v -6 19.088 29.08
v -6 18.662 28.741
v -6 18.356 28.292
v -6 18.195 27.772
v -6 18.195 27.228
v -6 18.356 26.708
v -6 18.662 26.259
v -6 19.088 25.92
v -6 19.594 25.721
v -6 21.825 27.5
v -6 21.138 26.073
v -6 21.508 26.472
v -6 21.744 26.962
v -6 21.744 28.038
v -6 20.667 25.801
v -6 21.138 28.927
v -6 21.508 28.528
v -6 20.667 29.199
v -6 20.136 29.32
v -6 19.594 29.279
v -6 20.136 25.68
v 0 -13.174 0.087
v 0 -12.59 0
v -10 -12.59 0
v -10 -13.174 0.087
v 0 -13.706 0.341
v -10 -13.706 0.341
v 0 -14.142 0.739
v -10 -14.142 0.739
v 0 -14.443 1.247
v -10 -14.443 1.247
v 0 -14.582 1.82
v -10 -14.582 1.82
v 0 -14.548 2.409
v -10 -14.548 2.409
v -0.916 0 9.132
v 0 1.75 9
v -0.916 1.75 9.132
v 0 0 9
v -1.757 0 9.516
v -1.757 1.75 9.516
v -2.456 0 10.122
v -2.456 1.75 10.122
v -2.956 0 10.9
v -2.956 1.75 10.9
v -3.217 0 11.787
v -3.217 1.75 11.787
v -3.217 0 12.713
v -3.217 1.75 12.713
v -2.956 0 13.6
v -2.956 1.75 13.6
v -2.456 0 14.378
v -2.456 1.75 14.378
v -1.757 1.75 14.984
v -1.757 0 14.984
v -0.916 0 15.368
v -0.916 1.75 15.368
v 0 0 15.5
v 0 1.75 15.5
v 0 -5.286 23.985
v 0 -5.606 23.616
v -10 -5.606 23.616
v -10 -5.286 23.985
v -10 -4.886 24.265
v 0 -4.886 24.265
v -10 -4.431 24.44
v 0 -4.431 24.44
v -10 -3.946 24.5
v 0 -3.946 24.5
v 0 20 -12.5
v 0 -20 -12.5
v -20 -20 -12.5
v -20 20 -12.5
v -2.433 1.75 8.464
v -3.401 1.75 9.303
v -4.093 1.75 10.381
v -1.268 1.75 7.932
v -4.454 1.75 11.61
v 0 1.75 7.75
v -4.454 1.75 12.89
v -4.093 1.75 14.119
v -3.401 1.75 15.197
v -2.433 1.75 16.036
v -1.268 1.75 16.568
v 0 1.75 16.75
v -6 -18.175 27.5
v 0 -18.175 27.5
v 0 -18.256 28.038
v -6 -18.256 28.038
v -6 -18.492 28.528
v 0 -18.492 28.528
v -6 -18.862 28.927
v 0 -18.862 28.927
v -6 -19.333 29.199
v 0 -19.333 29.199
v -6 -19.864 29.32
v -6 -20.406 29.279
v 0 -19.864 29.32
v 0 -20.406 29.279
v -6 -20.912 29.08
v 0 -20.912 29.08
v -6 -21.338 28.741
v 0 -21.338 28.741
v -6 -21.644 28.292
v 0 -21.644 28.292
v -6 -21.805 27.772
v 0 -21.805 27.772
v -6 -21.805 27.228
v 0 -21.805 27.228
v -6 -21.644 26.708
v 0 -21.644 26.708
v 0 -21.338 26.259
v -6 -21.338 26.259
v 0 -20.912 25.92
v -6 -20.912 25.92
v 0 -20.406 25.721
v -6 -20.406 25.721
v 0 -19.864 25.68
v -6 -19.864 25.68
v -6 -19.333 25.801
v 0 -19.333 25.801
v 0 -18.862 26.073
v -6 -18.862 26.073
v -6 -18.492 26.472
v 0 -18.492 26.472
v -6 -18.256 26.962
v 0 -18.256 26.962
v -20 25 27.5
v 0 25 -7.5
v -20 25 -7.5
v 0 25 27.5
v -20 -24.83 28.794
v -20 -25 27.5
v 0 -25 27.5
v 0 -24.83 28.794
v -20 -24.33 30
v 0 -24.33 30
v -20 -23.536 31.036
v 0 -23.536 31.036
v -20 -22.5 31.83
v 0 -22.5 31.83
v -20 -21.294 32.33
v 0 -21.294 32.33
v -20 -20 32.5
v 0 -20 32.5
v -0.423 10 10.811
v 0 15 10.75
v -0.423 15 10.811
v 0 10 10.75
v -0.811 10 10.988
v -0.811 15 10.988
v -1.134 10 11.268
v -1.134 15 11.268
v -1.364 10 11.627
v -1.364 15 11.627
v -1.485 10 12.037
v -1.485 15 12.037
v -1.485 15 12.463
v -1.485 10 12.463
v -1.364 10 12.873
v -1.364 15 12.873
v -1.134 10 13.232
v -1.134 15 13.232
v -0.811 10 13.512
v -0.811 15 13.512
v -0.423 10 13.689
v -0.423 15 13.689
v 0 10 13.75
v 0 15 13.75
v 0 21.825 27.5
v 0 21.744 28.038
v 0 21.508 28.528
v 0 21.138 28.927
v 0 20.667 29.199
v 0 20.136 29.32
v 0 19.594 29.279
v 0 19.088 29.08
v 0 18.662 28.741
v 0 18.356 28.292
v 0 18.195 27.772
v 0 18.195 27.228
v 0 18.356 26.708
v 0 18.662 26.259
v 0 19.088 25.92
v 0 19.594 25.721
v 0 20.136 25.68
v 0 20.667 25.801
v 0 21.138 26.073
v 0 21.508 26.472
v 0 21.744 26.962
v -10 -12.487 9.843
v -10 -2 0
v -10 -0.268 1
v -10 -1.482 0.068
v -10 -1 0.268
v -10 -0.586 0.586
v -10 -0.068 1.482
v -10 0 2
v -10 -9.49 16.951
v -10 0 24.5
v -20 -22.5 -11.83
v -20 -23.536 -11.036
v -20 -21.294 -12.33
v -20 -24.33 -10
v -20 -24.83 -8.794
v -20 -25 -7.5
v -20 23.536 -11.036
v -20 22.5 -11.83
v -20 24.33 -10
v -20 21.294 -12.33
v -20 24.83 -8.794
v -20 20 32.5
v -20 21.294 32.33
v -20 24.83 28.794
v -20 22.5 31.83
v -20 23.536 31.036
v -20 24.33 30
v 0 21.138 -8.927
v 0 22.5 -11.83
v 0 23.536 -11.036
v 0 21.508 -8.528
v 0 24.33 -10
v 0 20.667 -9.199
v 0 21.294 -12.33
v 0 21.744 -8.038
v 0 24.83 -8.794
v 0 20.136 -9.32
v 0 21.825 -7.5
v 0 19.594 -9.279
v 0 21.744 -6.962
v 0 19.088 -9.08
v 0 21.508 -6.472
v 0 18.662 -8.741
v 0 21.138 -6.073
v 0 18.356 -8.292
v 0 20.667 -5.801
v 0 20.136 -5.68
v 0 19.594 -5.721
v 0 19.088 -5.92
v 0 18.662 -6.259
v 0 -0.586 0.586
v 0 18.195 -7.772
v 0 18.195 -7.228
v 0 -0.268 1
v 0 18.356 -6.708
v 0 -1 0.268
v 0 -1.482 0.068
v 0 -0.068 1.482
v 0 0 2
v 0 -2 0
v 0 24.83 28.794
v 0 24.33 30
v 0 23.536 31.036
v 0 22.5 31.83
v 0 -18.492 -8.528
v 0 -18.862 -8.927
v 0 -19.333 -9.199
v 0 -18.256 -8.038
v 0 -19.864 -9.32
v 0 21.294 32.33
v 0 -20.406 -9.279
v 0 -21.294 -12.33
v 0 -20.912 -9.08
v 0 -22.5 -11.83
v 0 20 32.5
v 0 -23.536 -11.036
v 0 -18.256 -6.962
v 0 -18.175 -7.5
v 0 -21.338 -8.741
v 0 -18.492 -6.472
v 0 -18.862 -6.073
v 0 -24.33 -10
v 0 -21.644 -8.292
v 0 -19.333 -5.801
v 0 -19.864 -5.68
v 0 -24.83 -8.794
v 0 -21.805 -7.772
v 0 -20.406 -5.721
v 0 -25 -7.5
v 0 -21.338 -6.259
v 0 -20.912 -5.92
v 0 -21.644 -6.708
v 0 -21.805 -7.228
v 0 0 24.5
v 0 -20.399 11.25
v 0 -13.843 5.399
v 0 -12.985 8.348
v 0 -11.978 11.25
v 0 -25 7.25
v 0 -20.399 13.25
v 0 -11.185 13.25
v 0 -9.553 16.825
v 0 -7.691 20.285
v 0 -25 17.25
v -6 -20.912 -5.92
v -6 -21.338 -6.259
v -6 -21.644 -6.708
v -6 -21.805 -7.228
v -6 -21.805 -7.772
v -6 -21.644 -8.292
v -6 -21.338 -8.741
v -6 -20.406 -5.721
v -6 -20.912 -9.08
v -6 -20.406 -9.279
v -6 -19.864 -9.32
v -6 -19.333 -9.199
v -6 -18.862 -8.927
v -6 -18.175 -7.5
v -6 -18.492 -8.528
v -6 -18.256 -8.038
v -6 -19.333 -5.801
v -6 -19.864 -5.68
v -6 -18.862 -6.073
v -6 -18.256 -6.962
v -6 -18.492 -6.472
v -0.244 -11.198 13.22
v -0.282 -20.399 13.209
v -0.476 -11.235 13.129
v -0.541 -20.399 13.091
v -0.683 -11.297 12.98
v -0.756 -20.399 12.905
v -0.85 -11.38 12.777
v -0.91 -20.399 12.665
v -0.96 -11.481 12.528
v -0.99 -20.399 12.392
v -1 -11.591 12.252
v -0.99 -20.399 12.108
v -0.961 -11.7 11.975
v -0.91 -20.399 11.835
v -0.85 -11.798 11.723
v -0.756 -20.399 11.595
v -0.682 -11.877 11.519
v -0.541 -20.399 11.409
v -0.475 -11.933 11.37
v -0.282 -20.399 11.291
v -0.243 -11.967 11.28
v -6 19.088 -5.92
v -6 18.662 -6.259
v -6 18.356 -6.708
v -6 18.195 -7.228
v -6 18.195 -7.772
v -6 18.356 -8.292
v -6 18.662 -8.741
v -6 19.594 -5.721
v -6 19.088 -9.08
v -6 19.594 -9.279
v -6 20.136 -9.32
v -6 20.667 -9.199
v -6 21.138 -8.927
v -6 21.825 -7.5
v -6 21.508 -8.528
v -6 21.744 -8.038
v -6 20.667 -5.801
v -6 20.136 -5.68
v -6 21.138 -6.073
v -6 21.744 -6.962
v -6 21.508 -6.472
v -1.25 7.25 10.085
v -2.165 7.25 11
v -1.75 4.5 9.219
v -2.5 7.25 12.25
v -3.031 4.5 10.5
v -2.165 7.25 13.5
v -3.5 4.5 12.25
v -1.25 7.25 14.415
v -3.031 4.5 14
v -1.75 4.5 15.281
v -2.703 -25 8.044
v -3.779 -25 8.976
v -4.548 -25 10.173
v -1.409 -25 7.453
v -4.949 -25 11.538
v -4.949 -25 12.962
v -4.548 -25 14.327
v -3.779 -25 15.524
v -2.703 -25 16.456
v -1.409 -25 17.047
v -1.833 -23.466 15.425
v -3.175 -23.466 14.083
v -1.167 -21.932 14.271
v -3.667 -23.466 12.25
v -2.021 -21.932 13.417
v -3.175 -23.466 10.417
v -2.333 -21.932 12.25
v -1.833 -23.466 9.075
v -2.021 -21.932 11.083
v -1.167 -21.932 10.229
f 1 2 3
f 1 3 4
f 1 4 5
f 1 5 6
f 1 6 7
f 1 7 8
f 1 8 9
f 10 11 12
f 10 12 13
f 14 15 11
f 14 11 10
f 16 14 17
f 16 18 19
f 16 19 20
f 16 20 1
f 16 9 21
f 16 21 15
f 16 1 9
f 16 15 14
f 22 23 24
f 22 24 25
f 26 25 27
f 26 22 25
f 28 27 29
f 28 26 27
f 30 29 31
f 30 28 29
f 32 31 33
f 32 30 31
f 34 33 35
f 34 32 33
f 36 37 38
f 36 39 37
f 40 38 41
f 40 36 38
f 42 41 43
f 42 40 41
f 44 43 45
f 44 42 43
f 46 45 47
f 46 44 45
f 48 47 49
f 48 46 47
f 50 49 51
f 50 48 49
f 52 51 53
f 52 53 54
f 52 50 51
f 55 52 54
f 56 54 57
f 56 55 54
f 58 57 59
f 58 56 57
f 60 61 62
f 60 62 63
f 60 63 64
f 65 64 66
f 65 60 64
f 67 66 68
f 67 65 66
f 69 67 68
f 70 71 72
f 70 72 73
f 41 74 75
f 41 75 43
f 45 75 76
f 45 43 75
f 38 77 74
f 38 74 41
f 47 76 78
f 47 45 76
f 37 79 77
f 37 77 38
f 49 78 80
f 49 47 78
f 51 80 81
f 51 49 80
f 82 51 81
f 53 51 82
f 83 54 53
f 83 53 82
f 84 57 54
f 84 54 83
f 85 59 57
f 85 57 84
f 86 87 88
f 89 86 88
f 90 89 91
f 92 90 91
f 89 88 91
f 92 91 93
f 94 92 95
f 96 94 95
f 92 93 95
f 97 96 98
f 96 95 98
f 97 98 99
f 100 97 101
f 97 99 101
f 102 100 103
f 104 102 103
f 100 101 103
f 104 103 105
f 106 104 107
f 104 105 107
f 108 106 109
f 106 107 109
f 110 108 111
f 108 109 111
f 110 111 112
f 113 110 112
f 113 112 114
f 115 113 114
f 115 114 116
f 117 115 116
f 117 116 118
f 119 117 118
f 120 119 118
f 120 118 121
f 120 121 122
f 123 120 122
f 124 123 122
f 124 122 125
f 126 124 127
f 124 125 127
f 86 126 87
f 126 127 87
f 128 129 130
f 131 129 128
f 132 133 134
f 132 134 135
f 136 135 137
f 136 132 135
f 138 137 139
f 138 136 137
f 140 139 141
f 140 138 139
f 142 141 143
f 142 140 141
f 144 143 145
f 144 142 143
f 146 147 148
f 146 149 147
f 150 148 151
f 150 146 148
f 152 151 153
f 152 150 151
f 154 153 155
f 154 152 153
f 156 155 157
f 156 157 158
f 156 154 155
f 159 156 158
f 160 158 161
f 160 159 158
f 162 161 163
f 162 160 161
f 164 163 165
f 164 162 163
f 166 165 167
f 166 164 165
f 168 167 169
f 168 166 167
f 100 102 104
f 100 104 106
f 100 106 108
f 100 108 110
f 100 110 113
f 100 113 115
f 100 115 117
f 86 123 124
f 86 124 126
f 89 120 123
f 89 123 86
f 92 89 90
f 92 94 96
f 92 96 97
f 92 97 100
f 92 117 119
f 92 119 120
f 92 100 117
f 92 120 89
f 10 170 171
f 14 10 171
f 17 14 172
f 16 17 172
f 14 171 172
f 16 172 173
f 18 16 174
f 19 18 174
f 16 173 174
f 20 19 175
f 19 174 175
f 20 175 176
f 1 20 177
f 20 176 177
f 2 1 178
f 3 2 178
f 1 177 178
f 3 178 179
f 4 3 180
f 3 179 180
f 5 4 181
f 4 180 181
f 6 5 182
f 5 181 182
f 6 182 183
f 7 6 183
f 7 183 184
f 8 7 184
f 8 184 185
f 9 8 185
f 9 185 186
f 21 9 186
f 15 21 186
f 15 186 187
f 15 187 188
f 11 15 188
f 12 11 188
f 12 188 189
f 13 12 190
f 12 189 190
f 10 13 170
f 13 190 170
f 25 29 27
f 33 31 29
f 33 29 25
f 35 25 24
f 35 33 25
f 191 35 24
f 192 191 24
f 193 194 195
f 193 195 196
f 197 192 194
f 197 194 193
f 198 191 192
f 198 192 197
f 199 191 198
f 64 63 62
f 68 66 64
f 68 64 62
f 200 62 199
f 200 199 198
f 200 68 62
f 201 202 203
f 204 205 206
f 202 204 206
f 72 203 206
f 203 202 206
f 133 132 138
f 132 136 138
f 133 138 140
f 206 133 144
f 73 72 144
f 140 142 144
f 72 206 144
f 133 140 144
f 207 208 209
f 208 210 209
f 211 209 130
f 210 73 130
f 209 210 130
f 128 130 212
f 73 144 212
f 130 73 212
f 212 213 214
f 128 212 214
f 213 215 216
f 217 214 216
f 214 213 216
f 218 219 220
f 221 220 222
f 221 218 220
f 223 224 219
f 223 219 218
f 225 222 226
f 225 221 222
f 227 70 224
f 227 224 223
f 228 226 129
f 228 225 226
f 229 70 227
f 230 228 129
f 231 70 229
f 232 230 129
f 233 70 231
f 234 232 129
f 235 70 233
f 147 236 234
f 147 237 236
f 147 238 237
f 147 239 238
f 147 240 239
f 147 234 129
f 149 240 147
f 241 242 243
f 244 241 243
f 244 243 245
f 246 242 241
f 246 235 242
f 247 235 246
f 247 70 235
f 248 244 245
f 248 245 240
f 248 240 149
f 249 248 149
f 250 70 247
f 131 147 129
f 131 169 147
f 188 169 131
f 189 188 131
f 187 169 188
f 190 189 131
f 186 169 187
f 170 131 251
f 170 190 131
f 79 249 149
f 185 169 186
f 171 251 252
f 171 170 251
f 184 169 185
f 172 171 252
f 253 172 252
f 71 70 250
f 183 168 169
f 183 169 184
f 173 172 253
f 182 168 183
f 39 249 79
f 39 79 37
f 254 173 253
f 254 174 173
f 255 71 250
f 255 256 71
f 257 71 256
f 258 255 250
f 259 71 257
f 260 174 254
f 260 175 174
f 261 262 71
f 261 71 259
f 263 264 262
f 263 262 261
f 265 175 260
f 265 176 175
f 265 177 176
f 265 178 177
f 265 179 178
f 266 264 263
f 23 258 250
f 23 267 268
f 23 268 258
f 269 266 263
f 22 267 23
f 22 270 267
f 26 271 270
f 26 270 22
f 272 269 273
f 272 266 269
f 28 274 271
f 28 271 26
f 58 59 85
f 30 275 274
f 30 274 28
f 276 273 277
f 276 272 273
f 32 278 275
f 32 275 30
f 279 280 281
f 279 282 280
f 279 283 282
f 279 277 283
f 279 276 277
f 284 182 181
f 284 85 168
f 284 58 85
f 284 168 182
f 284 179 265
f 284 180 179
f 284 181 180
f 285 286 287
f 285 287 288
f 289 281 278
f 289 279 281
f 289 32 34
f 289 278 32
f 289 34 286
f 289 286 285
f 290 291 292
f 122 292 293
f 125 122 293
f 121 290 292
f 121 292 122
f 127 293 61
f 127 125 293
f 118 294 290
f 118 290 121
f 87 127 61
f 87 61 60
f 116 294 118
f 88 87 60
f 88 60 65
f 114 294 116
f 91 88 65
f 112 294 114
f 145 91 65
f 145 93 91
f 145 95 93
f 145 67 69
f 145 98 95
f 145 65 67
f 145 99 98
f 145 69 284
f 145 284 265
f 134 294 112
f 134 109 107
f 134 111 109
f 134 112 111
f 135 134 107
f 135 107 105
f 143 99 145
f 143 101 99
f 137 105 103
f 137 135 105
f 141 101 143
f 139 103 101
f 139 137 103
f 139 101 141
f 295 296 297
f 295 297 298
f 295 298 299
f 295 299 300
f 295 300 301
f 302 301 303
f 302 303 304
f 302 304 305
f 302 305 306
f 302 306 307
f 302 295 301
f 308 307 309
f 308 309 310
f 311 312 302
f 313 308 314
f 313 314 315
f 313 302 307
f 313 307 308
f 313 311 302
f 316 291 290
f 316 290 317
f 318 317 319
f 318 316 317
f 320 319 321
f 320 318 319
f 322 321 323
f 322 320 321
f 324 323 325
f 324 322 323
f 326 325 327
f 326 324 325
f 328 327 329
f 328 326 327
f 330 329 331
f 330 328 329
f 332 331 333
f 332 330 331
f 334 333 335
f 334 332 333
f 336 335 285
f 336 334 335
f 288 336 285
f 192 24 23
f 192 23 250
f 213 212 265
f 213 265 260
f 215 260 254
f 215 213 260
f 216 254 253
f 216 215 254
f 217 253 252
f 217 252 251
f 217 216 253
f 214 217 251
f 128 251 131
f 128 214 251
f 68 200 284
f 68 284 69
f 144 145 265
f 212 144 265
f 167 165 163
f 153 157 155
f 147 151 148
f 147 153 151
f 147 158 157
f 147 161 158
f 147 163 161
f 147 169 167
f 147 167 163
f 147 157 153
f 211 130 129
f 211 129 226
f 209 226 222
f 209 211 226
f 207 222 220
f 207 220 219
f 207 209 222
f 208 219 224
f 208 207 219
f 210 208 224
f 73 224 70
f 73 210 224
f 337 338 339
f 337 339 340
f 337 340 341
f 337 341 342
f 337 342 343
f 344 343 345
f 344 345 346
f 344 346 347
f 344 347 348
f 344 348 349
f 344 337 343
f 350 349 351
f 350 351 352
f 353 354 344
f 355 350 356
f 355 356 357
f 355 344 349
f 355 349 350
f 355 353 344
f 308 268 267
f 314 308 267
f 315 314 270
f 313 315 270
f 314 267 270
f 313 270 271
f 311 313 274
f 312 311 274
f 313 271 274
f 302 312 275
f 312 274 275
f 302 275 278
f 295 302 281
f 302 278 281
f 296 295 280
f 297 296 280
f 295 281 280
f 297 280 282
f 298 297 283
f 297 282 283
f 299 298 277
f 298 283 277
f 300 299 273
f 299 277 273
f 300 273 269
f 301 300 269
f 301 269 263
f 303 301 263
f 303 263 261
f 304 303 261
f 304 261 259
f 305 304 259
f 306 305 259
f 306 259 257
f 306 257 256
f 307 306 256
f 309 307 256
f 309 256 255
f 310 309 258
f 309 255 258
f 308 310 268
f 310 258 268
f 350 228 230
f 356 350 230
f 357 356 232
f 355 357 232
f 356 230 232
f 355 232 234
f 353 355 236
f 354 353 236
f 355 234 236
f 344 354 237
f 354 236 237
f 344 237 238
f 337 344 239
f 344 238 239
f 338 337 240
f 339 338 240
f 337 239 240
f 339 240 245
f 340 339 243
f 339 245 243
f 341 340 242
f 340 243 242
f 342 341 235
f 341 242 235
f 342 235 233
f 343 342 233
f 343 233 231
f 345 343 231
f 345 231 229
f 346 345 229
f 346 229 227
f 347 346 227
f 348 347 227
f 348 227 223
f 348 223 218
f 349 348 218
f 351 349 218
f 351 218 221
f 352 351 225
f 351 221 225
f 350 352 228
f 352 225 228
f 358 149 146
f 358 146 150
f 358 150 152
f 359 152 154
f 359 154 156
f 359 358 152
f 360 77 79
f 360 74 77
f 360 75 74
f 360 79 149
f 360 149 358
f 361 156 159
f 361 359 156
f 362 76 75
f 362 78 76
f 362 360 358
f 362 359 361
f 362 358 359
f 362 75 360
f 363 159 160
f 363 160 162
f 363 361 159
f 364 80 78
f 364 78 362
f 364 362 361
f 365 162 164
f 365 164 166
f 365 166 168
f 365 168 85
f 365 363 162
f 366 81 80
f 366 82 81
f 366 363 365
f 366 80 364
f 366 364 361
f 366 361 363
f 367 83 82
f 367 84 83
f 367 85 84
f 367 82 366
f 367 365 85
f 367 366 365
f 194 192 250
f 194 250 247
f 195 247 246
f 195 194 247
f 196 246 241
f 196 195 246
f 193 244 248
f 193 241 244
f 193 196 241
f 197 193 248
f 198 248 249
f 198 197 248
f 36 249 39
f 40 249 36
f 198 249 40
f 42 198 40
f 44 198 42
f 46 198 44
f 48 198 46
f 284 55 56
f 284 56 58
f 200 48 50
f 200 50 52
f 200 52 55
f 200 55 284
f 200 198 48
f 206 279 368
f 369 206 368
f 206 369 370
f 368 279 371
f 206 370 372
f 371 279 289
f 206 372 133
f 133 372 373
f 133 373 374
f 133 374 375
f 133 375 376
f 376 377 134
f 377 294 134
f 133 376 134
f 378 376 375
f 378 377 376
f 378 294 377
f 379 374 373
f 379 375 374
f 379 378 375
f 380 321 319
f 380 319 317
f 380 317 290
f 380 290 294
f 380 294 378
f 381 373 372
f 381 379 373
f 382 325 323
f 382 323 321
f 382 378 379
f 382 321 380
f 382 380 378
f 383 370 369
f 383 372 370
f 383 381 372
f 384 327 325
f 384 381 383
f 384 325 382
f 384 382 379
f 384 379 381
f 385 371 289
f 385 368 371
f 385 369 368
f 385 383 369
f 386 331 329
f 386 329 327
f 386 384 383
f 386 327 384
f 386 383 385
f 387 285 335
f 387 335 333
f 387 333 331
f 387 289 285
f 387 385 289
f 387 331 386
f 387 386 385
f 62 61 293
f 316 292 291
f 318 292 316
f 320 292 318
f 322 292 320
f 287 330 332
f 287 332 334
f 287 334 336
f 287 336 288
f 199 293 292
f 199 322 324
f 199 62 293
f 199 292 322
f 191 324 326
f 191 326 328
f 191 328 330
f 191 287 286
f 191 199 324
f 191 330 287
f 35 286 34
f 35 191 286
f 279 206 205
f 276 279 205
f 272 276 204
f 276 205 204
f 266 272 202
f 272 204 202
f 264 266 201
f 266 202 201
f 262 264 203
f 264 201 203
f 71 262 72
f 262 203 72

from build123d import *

# Parameters (mm, degrees)
F1_DEPTH        = 10
F5_R            = 2
F6_W            = 50
F6_H            = 45
F7_DEPTH        = 20
F10_D           = 2
F10_DEPTH       = 20
F10_CSINK_D     = 10
F10_CSINK_ANGLE = 82
F10_TIP         = 0.600860619
F11_R           = 5
F12_R           = 1.75
F13_DEPTH       = 5
F15_W           = 33.0769233406
F15_H           = 100.1923158765
F16_DEPTH       = 50.001
F17_R           = 1.825
F18_DEPTH       = 6


with BuildPart() as f1:
    # F0 (on Right) → F1 (new body, symmetric)
    with BuildSketch(Plane.YZ):
        with BuildLine():
            Line((-15, 0), (0, 0))
            Line((0, 0), (0, 24.5))
            Line((0, 24.5), (-5, 24.5))
            ThreePointArc((-5, 24.5), (-11.3675088396, 12.8081668733), (-15, 0))
        make_face()
    extrude(amount=F1_DEPTH, both=True)

    # F3 (on Right) → F4 (revolve)
    with BuildSketch(Plane.YZ):
        Polygon((0, 12.25), (15, 12.25), (15, 13.75), (10, 13.75), (1.75, 16.75), (1.75, 15.5), (0, 15.5), align=None)
    revolve(axis=Axis((0, 7.5, 12.25), (0, -1, 0)))

    # F5
    f5_edges = [f1.edges().sort_by_distance(p)[0] for p in [
        (0, -5, 24.5),
        (0, -15, 0),
        (0, 0, 0),
    ]]
    fillet(f5_edges, radius=F5_R)


with BuildPart() as f7:
    # F6 (on Right) → F7 (new body)
    with BuildSketch(Plane.YZ):
        with Locations((0, 10)):
            Rectangle(F6_W, F6_H)
    extrude(amount=F7_DEPTH)

    # F8: cut F1
    add(f1.part, mode=Mode.SUBTRACT)

    # F10
    with Locations(Plane.XZ.offset(25)):
        with Locations((0, 12.25)):
            CounterSinkHole(F10_D / 2, F10_CSINK_D / 2, depth=F10_DEPTH, counter_sink_angle=F10_CSINK_ANGLE)
            with Locations((0, 0, -(F10_DEPTH + F10_TIP / 2))):  # 118° drill point
                Cone(0, F10_D / 2, F10_TIP, mode=Mode.SUBTRACT)

    # F11
    f11_edges = [f7.edges().sort_by_distance(p)[0] for p in [
        (10, -25, 32.5),
        (10, 25, 32.5),
        (10, -25, -12.5),
        (10, 25, -12.5),
    ]]
    fillet(f11_edges, radius=F11_R)

    # F12 (on face) → F13 (join)
    with BuildSketch(Plane.YZ):
        with Locations((20, 27.5)):
            Circle(F12_R)
        with Locations((-20, 27.5)):
            Circle(F12_R)
        with Locations((-20, -7.5)):
            Circle(F12_R)
        with Locations((20, -7.5)):
            Circle(F12_R)
    extrude(amount=-F13_DEPTH)

    # F14: F7 across plane


with BuildPart() as f7_1:
    add(f7.part)
    add(f7.part.mirror(Plane.YZ))

    # F15 (on face) → F16 (cut, through all)
    with BuildSketch(Plane.XZ.offset(25)):
        with Locations((16.5384616703, 1.5384629369)):
            Rectangle(F15_W, F15_H)
    extrude(amount=-F16_DEPTH, mode=Mode.SUBTRACT)

    # F17 (on face) → F18 (cut)
    with BuildSketch(Plane.YZ):
        with Locations((-20, 27.5)):
            Circle(F17_R)
        with Locations((20, 27.5)):
            Circle(F17_R)
        with Locations((20, -7.5)):
            Circle(F17_R)
        with Locations((-20, -7.5)):
            Circle(F17_R)
    extrude(amount=-F18_DEPTH, mode=Mode.SUBTRACT)


solid = f7_1.part
